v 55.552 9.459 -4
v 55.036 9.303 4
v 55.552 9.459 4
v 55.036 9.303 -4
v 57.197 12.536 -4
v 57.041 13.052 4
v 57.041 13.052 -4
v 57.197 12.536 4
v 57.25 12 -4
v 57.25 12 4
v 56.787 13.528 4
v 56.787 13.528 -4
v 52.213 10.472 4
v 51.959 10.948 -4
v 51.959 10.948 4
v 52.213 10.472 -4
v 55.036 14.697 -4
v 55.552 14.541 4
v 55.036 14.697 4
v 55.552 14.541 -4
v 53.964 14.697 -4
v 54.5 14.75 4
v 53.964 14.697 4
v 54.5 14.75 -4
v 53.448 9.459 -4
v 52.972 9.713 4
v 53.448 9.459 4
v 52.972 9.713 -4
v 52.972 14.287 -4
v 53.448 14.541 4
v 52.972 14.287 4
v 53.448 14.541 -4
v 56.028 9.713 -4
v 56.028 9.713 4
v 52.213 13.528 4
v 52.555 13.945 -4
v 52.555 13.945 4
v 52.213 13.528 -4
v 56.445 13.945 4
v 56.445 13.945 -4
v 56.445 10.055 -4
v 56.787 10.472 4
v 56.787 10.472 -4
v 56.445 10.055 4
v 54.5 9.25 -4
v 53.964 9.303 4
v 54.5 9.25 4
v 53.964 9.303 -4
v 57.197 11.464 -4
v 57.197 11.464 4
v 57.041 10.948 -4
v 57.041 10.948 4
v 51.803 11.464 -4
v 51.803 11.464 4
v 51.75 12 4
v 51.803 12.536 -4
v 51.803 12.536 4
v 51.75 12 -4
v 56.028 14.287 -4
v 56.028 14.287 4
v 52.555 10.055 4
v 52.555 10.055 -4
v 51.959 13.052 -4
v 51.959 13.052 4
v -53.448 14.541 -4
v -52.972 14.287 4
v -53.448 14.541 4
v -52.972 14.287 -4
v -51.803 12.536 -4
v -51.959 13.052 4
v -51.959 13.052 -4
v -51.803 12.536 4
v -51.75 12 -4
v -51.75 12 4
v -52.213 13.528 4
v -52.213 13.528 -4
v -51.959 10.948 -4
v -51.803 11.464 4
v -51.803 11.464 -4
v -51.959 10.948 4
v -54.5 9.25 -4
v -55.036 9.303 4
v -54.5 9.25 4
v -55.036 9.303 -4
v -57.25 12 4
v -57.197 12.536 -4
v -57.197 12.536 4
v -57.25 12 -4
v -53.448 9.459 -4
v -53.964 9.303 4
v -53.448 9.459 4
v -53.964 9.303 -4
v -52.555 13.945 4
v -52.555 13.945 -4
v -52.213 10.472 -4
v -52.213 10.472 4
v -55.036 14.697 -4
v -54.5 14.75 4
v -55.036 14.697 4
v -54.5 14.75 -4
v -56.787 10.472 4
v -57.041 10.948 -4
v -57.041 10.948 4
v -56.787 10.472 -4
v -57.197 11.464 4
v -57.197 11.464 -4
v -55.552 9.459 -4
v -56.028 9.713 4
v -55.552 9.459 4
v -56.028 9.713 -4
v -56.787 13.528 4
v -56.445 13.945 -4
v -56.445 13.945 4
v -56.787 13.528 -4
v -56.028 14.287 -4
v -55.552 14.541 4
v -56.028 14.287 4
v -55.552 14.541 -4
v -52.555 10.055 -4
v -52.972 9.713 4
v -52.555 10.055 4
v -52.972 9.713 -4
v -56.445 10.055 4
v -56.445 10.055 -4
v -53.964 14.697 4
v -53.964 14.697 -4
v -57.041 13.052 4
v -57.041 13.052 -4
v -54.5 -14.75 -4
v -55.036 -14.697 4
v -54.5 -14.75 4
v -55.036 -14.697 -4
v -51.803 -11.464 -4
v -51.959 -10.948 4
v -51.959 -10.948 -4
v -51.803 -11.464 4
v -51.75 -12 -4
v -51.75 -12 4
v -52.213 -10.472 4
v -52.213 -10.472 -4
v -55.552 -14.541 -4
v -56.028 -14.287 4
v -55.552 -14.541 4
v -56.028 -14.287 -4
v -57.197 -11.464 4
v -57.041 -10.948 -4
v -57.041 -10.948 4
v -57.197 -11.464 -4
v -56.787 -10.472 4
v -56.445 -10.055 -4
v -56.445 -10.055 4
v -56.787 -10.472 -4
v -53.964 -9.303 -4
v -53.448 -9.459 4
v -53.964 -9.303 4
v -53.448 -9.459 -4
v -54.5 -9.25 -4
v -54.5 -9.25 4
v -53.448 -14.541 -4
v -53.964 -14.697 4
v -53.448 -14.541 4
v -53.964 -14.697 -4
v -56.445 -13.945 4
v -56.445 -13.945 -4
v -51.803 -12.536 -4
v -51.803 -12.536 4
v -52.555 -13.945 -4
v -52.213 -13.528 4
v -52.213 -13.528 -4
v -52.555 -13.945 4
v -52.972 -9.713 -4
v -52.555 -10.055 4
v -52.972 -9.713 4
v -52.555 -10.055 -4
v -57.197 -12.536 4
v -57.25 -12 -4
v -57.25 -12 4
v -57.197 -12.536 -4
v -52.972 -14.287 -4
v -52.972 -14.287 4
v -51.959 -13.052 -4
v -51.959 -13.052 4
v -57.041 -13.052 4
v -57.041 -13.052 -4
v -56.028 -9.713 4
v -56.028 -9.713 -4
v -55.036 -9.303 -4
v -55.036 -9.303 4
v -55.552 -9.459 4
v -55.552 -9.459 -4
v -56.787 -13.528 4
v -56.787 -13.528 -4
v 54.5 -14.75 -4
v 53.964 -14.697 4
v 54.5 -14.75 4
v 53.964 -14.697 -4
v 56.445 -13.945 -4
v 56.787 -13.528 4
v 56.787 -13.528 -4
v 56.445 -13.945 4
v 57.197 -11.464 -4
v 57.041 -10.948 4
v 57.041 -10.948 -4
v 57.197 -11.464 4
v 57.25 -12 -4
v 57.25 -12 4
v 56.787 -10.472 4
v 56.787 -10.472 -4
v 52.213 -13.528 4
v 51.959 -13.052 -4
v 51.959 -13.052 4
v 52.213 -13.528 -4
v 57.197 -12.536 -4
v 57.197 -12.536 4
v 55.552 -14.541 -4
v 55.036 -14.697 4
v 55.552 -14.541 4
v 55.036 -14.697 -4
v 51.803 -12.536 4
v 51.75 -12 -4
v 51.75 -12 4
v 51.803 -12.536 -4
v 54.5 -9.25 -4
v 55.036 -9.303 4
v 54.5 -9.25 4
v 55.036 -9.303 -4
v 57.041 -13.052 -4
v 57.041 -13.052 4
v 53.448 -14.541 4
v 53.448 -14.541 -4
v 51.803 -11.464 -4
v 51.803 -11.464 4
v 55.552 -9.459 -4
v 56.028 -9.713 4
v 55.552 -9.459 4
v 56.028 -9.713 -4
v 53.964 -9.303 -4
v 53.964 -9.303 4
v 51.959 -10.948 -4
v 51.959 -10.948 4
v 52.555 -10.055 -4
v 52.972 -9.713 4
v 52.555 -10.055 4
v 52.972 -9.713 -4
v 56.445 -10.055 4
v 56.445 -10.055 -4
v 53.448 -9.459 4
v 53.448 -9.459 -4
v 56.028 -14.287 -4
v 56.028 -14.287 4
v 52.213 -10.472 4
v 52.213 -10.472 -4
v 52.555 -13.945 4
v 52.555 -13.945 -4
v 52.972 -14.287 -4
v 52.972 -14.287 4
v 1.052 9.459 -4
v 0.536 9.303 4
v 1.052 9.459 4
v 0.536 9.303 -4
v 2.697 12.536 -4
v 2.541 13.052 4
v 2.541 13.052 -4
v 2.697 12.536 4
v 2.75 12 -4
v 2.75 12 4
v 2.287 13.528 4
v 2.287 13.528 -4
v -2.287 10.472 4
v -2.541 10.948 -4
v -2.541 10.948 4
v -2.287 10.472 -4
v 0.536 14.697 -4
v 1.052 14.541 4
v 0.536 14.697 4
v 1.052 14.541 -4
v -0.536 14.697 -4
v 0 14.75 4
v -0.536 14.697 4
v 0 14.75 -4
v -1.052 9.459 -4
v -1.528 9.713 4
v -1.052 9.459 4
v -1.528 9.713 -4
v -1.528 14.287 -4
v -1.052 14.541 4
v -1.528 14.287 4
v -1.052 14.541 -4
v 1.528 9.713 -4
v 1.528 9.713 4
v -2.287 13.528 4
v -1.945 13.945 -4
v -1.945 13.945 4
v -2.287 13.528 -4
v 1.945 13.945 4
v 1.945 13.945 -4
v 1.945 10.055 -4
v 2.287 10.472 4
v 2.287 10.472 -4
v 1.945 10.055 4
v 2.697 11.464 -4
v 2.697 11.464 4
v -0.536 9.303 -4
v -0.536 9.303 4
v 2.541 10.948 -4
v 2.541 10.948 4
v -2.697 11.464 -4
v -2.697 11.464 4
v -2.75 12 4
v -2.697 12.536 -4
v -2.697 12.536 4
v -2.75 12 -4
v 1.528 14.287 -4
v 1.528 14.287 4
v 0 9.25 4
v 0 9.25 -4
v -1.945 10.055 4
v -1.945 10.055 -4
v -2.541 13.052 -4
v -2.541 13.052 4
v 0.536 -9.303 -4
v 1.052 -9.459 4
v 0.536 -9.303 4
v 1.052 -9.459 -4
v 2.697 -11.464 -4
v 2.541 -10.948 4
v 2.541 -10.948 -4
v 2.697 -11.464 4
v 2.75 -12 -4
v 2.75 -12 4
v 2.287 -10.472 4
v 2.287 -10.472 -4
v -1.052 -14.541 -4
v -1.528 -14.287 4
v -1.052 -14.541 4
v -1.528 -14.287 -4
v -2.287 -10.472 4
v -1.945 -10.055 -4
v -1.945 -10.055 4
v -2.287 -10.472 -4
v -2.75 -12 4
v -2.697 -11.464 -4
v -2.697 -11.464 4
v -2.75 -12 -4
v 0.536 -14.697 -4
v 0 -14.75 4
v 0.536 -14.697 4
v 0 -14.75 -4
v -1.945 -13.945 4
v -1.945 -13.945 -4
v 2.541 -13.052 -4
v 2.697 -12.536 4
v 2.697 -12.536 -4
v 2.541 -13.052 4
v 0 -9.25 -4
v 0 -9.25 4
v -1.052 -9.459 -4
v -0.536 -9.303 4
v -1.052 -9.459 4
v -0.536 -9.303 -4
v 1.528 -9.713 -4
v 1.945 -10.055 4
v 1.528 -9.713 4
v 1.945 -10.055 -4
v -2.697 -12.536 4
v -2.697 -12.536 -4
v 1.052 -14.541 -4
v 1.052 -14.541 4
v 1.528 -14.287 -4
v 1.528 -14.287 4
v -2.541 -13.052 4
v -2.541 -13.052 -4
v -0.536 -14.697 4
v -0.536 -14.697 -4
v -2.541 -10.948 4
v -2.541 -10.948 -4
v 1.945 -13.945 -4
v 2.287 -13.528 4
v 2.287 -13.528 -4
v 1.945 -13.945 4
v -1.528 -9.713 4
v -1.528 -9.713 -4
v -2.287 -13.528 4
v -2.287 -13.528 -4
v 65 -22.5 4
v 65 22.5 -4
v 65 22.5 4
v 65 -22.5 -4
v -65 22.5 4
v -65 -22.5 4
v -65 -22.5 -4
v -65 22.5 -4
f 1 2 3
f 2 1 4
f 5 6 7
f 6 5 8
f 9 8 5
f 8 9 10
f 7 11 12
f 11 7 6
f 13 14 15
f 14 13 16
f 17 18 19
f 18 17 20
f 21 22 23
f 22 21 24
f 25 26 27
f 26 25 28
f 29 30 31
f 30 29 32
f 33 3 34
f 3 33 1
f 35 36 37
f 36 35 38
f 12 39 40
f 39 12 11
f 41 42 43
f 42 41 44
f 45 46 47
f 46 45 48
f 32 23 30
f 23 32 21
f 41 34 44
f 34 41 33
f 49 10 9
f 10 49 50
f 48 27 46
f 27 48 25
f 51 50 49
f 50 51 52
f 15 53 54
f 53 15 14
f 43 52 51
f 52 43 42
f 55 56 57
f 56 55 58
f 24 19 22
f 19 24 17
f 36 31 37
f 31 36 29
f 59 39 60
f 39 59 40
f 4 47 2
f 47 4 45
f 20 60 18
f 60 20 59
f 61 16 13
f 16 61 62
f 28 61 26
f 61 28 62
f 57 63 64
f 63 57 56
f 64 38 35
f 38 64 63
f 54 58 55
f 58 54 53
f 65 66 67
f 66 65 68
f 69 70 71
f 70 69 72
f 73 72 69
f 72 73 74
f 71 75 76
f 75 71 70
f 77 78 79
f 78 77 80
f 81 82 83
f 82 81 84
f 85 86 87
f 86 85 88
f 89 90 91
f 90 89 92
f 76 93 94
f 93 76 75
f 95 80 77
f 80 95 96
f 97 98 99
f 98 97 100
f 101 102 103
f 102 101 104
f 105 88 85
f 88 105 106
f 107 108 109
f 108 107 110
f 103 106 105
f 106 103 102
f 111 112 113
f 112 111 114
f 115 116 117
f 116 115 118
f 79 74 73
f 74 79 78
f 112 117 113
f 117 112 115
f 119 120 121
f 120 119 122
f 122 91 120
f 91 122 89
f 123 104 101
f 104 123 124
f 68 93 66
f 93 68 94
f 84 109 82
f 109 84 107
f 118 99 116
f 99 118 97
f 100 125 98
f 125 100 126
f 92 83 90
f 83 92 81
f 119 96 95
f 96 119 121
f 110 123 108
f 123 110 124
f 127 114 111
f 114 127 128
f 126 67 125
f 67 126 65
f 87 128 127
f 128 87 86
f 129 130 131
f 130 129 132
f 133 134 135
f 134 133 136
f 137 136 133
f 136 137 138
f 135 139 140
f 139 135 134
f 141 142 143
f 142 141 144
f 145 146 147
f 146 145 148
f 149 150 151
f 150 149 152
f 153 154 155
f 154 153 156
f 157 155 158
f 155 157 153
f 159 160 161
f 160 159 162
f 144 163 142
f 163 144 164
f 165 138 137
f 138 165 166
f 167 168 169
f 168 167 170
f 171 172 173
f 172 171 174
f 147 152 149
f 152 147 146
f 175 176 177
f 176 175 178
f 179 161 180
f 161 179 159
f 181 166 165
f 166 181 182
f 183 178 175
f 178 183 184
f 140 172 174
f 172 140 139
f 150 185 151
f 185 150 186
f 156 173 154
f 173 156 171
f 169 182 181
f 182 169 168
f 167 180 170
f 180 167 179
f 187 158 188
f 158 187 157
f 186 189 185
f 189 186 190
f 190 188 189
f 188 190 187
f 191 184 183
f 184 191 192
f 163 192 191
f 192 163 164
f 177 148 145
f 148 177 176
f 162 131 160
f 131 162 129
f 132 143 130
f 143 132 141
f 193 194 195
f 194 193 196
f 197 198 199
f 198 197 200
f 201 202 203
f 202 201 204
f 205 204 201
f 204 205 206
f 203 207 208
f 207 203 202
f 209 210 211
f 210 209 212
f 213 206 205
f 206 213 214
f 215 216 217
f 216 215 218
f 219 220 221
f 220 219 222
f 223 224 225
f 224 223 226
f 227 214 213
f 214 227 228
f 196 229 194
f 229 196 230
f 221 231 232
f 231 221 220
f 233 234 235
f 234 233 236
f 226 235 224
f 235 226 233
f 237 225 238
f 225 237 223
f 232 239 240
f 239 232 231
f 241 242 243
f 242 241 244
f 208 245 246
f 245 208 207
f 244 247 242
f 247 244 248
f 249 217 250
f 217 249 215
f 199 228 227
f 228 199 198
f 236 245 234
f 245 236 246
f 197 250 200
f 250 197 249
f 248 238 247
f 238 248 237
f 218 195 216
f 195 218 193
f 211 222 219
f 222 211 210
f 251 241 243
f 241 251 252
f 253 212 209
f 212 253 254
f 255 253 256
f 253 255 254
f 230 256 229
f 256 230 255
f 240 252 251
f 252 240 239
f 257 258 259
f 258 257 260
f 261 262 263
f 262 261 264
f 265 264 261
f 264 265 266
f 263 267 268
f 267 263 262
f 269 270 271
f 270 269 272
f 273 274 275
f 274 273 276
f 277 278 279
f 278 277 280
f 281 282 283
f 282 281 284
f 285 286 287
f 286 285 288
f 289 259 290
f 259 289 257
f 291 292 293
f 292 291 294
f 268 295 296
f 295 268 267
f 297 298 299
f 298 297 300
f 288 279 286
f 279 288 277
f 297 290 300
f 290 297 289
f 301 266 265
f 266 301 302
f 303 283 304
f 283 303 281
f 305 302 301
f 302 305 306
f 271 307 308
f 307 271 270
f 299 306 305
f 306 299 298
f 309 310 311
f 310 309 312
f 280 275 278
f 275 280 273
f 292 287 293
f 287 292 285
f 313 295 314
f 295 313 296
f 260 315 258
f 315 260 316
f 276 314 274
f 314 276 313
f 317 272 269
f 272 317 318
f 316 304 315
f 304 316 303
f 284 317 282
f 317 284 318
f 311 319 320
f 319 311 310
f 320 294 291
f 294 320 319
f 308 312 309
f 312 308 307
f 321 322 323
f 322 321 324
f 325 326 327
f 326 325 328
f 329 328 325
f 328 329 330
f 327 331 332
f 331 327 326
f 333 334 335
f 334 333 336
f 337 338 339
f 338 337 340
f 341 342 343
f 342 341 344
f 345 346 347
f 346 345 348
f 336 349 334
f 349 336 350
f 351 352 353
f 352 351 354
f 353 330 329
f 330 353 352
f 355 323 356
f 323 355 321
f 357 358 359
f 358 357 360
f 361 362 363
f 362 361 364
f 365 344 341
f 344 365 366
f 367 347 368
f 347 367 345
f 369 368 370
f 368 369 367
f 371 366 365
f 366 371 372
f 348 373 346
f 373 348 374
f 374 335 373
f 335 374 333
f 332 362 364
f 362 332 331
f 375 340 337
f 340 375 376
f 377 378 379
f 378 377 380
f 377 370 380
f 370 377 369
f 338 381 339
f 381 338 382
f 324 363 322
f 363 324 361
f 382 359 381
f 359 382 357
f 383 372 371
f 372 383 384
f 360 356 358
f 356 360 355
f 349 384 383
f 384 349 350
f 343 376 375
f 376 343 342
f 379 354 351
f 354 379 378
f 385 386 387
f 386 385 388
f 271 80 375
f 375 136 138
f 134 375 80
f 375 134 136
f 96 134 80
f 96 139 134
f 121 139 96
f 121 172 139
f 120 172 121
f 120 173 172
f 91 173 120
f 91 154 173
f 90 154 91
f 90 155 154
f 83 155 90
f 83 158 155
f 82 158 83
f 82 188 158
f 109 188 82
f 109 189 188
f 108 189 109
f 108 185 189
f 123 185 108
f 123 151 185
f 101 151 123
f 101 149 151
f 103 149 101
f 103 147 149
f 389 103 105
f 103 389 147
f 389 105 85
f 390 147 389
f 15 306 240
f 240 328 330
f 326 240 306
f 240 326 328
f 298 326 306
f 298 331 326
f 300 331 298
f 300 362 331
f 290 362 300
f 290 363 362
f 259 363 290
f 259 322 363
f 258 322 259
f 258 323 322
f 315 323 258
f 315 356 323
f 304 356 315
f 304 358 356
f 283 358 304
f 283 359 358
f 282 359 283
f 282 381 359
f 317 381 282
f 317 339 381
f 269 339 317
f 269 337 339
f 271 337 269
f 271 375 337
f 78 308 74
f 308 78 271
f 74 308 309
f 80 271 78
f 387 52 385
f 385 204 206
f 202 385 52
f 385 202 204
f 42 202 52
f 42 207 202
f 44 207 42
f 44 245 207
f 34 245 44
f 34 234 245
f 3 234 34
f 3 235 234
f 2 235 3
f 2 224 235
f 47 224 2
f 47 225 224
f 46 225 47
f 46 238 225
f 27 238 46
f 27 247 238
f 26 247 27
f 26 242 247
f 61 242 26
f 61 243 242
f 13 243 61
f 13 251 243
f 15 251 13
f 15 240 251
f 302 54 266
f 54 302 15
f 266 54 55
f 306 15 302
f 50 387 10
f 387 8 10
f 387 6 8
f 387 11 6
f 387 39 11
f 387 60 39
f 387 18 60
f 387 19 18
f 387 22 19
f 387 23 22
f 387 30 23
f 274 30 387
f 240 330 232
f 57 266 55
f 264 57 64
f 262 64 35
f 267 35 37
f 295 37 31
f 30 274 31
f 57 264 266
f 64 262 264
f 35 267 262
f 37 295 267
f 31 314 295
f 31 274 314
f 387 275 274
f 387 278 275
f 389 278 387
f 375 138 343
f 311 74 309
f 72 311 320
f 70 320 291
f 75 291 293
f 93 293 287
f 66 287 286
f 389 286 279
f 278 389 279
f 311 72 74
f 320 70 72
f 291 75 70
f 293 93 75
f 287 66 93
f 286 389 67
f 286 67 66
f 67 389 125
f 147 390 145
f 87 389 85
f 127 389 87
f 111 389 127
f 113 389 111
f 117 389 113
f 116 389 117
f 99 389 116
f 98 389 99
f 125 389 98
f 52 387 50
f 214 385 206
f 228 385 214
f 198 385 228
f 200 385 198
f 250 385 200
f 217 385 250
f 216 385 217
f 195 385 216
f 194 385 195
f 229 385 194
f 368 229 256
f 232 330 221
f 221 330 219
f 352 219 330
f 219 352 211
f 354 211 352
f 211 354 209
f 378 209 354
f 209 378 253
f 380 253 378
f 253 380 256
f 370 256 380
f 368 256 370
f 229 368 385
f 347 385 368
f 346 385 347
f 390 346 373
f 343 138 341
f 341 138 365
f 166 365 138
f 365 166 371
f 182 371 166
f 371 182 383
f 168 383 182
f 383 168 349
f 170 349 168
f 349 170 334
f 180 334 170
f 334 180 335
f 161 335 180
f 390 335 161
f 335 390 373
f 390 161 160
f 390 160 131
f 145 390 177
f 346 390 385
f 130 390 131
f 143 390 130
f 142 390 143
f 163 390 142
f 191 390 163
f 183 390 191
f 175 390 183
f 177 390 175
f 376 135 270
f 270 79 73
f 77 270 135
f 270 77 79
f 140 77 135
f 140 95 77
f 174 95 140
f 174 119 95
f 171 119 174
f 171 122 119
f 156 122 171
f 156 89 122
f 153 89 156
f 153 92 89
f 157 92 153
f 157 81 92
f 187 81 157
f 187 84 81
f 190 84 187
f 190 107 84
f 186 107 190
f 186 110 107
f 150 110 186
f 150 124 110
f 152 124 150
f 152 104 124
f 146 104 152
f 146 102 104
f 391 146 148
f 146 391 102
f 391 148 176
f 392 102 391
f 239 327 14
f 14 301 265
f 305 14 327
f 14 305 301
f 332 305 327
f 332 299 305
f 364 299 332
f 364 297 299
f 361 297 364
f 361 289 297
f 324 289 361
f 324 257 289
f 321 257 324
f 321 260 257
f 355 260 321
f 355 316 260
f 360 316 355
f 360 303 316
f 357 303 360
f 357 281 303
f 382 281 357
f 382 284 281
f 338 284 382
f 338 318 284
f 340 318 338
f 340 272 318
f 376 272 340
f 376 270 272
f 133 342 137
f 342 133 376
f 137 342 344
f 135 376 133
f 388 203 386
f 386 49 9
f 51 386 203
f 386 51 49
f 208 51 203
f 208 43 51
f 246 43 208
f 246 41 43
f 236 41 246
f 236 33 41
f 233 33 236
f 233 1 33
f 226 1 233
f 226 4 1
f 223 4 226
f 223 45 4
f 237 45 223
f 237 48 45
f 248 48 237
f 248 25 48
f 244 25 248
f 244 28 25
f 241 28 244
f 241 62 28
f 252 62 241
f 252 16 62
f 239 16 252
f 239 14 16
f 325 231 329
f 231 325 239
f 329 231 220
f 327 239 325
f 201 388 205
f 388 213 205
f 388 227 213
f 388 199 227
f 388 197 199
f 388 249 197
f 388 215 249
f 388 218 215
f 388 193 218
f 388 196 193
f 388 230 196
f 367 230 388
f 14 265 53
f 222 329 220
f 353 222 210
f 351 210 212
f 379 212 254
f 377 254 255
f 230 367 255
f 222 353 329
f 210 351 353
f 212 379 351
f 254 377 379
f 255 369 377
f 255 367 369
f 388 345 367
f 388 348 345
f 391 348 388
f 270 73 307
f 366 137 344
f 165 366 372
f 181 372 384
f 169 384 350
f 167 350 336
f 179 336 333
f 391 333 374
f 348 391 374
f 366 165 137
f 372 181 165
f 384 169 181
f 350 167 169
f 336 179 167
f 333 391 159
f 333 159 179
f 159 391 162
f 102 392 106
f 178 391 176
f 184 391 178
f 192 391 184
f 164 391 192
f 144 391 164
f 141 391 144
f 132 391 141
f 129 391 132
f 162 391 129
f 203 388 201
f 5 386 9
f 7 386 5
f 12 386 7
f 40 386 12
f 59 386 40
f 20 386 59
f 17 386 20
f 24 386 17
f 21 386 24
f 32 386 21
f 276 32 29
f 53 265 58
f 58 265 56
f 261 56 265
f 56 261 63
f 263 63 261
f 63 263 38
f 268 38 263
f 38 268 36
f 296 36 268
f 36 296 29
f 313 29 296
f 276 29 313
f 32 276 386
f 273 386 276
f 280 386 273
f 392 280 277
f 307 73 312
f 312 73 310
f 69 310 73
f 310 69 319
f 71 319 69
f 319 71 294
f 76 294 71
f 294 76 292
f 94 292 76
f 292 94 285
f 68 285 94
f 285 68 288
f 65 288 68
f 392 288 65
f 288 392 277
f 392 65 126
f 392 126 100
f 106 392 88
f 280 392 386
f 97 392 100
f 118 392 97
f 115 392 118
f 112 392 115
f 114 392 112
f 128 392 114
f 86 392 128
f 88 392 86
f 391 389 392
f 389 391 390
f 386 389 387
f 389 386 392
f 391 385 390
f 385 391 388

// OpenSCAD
$fn = 32;

// ----------------------------------------------------------------------
// Corner plate 130 x 45 x 8
// 6 holes, centres taken from the edge offset
// ----------------------------------------------------------------------

// --- parameters (mm) ---
plate = [130, 45, 8];  // overall size (x, y, z)
holes = 6;             // number of holes the drawing asks for
hole_d = 5.5;          // hole diameter
edge = 10.5;           // hole centre offset from the plate edge

// --- derived feature positions (mm) ---
corner_x = plate[0] / 2 - edge;  // = 54.5   corner hole X
corner_y = plate[1] / 2 - edge;  // = 12   corner hole Y
feature_centers = [
  [corner_x, corner_y],
  [-corner_x, corner_y],
  [-corner_x, -corner_y],
  [corner_x, -corner_y],
  [0, corner_y],
  [0, -corner_y]
];   // hole centres the loop below drills

// plate outline, every hole drilled through with the same cutters
difference() {
  cube(plate, center = true);
  for (centre = feature_centers)
    translate([centre[0], centre[1], 0])
      cylinder(d = hole_d, h = plate[2] + 2, center = true);
}
